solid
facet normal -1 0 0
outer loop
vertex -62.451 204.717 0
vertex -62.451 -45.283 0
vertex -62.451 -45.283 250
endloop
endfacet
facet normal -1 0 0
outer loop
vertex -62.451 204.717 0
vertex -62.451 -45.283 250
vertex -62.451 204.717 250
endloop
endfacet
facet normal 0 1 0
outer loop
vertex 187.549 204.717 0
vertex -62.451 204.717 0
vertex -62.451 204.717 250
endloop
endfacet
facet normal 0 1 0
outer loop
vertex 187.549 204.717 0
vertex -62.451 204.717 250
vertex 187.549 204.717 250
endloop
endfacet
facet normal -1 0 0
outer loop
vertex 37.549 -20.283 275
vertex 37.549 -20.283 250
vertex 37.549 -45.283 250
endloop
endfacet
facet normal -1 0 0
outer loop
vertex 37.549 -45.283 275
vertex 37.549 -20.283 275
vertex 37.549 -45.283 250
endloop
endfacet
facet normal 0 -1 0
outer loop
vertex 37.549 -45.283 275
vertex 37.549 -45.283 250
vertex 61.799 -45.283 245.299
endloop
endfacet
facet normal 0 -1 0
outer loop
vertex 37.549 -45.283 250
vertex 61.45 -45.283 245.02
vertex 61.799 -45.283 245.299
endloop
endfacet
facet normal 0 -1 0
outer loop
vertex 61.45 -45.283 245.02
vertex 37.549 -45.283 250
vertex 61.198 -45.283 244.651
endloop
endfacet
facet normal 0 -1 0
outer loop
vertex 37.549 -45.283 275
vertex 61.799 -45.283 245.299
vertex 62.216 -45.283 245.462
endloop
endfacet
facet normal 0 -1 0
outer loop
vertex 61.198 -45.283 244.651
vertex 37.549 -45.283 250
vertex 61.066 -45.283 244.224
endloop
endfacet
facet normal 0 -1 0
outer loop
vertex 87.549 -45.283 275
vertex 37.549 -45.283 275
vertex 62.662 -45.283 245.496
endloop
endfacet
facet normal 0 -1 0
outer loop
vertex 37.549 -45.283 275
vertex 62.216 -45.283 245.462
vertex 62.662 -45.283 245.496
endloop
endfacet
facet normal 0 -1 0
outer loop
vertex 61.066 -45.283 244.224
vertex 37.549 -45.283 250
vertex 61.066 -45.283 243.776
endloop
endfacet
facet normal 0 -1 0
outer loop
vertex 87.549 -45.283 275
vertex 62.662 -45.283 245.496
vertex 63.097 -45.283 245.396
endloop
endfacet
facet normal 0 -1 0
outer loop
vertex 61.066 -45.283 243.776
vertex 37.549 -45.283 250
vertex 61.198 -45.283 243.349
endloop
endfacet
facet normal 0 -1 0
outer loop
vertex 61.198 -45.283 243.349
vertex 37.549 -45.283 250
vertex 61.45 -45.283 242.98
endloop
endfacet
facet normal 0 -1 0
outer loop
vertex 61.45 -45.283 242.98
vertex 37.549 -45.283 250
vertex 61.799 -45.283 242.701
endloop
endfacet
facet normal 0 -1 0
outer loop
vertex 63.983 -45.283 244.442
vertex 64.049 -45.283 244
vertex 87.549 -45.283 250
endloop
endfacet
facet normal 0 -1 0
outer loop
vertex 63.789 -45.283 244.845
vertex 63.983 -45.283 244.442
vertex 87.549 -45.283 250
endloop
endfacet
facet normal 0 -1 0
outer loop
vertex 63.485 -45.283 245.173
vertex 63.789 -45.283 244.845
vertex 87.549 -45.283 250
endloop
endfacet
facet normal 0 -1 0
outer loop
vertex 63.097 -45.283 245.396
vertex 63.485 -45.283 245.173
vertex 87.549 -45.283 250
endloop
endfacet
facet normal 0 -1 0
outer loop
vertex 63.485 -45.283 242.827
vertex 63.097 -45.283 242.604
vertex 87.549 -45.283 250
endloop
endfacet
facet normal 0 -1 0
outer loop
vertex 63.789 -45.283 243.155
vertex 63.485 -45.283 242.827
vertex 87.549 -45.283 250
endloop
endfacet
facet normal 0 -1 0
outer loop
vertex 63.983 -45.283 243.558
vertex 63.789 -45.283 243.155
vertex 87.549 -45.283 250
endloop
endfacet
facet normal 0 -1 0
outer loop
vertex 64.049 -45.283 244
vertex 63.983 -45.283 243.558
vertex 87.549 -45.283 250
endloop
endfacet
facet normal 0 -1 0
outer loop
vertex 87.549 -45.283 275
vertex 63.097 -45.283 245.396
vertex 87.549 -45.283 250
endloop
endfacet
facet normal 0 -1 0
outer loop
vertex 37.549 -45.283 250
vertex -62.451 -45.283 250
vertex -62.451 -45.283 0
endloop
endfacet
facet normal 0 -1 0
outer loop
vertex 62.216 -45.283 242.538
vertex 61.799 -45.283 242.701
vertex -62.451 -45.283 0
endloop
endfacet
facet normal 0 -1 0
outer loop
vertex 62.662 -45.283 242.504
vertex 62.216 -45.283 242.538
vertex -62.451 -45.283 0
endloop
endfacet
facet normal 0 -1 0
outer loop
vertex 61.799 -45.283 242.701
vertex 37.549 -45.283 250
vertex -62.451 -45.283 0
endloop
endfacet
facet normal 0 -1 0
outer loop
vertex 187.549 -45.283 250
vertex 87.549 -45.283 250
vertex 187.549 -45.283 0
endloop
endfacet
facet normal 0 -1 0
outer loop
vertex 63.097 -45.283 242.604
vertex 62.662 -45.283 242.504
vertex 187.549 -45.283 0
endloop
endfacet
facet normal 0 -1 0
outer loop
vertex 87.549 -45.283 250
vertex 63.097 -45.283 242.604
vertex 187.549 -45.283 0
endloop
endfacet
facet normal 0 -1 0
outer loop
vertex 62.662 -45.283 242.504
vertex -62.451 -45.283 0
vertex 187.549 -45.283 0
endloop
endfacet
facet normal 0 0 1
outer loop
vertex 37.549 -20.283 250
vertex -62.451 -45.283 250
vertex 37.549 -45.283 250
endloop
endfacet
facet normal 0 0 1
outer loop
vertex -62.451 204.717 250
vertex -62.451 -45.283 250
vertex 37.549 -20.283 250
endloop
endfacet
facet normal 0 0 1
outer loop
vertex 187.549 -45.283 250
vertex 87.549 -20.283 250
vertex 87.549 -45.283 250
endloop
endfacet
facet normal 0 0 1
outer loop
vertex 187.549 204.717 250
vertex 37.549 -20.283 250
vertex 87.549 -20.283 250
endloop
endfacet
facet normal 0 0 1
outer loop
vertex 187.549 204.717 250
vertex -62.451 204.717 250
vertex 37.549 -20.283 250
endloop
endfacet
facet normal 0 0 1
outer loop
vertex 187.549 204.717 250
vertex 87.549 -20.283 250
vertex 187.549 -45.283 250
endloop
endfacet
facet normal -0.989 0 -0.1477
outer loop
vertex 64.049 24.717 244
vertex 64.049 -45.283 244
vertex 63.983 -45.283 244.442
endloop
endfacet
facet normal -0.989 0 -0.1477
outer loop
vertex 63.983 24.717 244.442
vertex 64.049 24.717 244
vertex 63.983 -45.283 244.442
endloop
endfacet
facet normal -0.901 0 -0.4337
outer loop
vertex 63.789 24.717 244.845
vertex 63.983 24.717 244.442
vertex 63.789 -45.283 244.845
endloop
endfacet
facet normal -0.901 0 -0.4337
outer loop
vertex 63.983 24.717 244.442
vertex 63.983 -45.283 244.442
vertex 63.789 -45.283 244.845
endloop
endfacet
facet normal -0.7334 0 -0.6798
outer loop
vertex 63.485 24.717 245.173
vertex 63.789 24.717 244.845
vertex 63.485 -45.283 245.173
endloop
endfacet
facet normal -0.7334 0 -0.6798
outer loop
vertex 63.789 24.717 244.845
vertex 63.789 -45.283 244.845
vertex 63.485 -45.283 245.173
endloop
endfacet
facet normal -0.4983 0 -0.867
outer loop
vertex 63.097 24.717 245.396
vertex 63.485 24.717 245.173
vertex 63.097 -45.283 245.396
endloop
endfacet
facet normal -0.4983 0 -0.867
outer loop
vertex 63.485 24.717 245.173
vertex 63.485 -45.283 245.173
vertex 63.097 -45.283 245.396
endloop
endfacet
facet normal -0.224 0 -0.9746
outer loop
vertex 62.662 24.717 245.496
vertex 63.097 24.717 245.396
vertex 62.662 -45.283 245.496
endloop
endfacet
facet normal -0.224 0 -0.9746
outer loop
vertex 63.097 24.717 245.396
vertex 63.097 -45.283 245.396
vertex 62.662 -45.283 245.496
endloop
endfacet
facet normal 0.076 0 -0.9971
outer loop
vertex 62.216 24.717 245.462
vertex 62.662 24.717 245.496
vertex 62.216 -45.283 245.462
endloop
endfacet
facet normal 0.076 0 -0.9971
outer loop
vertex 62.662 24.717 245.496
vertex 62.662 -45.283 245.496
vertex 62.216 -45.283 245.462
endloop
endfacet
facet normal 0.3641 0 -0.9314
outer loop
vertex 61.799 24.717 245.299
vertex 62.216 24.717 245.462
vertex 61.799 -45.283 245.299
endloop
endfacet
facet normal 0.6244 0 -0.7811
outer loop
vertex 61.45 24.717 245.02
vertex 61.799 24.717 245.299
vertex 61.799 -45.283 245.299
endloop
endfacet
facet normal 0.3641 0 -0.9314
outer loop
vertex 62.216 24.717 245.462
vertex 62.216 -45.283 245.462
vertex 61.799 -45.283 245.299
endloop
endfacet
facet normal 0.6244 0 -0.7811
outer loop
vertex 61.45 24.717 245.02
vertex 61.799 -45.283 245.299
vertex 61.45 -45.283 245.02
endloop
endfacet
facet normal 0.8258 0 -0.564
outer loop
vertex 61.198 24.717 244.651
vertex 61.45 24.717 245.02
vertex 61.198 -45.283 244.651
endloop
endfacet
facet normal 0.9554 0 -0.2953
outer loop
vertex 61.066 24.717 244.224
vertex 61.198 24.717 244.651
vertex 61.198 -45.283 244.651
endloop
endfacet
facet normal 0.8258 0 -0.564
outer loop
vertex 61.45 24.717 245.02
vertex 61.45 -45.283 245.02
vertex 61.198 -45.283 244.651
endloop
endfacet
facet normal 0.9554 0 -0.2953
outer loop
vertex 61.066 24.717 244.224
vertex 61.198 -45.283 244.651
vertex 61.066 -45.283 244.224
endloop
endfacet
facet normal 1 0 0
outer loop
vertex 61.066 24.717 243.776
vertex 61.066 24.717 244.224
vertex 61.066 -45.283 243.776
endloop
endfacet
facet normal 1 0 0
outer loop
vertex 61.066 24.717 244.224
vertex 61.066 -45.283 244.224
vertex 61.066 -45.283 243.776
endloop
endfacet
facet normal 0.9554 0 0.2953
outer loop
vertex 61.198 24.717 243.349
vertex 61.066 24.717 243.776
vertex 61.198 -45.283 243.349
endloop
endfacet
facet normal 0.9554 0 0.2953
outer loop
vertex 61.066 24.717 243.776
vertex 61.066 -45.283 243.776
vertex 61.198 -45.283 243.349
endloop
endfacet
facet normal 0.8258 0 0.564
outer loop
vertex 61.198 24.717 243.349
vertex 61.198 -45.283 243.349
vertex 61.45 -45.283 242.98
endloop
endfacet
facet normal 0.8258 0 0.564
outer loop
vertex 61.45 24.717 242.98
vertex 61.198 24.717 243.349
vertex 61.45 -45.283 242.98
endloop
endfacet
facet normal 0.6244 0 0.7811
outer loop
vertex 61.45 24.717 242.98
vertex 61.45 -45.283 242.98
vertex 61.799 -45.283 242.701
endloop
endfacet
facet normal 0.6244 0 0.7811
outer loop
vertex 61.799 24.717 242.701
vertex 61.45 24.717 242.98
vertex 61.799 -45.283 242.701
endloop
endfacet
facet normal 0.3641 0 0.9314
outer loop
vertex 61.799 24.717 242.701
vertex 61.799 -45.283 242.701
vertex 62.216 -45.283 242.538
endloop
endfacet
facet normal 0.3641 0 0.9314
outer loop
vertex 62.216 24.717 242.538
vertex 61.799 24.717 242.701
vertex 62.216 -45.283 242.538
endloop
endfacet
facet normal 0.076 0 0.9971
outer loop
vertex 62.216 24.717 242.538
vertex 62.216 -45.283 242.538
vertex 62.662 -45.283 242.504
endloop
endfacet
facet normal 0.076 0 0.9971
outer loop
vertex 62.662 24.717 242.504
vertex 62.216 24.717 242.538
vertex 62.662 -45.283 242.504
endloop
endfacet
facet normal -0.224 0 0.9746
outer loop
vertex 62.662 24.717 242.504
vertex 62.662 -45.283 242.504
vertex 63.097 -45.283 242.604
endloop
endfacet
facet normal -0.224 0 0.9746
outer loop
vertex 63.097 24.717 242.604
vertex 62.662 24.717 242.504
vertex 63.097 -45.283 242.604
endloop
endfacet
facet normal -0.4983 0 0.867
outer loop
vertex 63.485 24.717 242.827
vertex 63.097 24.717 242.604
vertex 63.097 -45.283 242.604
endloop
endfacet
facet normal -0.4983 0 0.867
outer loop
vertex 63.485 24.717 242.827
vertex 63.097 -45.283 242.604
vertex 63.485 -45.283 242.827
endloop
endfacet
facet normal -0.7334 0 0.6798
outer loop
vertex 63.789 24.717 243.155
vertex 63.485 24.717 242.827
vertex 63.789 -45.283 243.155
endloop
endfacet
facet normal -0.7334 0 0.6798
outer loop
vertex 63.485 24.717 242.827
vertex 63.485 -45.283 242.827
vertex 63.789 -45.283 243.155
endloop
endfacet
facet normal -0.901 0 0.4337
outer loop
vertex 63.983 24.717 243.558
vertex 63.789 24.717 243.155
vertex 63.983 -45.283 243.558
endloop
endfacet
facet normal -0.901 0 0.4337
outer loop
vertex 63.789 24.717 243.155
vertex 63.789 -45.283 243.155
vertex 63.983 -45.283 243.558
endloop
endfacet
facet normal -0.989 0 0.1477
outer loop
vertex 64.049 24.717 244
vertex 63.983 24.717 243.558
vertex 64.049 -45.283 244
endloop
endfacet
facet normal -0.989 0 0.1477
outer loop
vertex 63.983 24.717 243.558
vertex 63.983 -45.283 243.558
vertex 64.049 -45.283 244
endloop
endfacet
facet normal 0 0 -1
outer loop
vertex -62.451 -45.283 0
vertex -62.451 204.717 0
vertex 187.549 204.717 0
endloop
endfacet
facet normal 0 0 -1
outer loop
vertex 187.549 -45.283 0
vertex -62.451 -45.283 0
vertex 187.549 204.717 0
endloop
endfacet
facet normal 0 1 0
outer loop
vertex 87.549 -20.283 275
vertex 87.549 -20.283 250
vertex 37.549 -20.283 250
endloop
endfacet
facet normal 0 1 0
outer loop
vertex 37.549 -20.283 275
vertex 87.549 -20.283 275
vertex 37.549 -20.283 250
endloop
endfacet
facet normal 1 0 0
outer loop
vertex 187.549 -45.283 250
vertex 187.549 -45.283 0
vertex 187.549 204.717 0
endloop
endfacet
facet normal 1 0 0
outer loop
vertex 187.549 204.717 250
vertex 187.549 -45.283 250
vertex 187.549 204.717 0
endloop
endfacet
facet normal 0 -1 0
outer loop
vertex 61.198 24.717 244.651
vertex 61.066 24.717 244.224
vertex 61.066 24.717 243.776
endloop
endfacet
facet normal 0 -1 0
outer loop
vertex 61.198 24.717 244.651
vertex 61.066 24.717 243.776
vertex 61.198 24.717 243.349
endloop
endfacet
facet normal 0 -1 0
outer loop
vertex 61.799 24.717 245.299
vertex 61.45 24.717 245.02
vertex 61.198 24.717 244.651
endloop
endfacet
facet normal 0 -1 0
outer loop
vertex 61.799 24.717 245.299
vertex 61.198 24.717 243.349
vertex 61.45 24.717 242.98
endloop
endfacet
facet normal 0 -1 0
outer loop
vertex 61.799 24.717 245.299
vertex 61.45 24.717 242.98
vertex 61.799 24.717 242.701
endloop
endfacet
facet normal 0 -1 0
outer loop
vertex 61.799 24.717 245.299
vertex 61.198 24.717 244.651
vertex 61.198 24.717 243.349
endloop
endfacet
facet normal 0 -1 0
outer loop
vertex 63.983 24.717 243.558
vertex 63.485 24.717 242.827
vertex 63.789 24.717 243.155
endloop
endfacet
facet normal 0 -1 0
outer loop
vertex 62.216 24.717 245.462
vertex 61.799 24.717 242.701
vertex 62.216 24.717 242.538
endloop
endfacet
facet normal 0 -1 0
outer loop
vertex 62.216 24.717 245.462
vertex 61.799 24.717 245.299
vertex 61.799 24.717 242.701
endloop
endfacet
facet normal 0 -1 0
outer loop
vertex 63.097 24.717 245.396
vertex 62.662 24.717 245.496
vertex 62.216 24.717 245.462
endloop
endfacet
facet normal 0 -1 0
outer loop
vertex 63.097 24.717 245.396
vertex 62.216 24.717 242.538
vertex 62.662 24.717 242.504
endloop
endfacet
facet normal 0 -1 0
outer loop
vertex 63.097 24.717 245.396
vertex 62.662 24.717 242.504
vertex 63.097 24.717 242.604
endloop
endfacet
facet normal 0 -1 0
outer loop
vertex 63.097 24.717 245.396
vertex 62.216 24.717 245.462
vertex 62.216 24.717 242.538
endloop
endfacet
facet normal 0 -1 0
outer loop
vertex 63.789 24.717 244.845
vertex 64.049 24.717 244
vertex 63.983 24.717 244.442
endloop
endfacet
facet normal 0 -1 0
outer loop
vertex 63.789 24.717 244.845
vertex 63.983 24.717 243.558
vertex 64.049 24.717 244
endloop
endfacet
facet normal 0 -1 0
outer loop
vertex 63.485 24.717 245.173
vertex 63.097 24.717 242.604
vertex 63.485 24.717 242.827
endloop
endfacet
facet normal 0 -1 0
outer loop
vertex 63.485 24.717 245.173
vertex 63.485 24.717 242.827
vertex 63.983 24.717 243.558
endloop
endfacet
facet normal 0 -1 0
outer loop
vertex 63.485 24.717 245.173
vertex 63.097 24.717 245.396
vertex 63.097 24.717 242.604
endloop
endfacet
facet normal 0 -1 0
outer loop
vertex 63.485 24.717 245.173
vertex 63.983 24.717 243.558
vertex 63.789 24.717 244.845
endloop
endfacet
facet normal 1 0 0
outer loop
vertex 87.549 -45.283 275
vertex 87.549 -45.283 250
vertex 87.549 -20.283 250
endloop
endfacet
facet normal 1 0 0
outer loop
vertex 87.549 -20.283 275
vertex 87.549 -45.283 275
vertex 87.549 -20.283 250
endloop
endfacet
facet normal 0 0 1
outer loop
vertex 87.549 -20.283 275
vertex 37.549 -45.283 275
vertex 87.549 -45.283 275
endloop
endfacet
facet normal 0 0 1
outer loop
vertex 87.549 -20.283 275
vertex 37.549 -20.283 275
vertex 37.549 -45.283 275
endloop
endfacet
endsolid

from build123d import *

# Parameters (mm, degrees)
F0_W     = 250
F0_H     = 250
F1_DEPTH = 250
F3_DEPTH = 25
F4_R     = 1.5
F5_DEPTH = 70


with BuildPart() as f1:
    # F0 (on Top) → F1 (new body)
    with BuildSketch(Plane.XY):
        with Locations((62.549456, 79.716726)):
            Rectangle(F0_W, F0_H)
    extrude(amount=F1_DEPTH)

    # F2 (on face) → F3 (join)
    with BuildSketch(Plane.XY.offset(250)):
        Polygon((37.549456, -45.283274), (62.549456, -45.283274), (87.549456, -45.283274), (87.549456, -20.283274), (37.549456, -20.283274), align=None)
    extrude(amount=F3_DEPTH)

    # F4 (on face) → F5 (cut)
    with BuildSketch(Plane.XZ.offset(45.283274)):
        with Locations((62.549456, 244)):
            Circle(F4_R)
    extrude(amount=-F5_DEPTH, mode=Mode.SUBTRACT)


solid = f1.part
